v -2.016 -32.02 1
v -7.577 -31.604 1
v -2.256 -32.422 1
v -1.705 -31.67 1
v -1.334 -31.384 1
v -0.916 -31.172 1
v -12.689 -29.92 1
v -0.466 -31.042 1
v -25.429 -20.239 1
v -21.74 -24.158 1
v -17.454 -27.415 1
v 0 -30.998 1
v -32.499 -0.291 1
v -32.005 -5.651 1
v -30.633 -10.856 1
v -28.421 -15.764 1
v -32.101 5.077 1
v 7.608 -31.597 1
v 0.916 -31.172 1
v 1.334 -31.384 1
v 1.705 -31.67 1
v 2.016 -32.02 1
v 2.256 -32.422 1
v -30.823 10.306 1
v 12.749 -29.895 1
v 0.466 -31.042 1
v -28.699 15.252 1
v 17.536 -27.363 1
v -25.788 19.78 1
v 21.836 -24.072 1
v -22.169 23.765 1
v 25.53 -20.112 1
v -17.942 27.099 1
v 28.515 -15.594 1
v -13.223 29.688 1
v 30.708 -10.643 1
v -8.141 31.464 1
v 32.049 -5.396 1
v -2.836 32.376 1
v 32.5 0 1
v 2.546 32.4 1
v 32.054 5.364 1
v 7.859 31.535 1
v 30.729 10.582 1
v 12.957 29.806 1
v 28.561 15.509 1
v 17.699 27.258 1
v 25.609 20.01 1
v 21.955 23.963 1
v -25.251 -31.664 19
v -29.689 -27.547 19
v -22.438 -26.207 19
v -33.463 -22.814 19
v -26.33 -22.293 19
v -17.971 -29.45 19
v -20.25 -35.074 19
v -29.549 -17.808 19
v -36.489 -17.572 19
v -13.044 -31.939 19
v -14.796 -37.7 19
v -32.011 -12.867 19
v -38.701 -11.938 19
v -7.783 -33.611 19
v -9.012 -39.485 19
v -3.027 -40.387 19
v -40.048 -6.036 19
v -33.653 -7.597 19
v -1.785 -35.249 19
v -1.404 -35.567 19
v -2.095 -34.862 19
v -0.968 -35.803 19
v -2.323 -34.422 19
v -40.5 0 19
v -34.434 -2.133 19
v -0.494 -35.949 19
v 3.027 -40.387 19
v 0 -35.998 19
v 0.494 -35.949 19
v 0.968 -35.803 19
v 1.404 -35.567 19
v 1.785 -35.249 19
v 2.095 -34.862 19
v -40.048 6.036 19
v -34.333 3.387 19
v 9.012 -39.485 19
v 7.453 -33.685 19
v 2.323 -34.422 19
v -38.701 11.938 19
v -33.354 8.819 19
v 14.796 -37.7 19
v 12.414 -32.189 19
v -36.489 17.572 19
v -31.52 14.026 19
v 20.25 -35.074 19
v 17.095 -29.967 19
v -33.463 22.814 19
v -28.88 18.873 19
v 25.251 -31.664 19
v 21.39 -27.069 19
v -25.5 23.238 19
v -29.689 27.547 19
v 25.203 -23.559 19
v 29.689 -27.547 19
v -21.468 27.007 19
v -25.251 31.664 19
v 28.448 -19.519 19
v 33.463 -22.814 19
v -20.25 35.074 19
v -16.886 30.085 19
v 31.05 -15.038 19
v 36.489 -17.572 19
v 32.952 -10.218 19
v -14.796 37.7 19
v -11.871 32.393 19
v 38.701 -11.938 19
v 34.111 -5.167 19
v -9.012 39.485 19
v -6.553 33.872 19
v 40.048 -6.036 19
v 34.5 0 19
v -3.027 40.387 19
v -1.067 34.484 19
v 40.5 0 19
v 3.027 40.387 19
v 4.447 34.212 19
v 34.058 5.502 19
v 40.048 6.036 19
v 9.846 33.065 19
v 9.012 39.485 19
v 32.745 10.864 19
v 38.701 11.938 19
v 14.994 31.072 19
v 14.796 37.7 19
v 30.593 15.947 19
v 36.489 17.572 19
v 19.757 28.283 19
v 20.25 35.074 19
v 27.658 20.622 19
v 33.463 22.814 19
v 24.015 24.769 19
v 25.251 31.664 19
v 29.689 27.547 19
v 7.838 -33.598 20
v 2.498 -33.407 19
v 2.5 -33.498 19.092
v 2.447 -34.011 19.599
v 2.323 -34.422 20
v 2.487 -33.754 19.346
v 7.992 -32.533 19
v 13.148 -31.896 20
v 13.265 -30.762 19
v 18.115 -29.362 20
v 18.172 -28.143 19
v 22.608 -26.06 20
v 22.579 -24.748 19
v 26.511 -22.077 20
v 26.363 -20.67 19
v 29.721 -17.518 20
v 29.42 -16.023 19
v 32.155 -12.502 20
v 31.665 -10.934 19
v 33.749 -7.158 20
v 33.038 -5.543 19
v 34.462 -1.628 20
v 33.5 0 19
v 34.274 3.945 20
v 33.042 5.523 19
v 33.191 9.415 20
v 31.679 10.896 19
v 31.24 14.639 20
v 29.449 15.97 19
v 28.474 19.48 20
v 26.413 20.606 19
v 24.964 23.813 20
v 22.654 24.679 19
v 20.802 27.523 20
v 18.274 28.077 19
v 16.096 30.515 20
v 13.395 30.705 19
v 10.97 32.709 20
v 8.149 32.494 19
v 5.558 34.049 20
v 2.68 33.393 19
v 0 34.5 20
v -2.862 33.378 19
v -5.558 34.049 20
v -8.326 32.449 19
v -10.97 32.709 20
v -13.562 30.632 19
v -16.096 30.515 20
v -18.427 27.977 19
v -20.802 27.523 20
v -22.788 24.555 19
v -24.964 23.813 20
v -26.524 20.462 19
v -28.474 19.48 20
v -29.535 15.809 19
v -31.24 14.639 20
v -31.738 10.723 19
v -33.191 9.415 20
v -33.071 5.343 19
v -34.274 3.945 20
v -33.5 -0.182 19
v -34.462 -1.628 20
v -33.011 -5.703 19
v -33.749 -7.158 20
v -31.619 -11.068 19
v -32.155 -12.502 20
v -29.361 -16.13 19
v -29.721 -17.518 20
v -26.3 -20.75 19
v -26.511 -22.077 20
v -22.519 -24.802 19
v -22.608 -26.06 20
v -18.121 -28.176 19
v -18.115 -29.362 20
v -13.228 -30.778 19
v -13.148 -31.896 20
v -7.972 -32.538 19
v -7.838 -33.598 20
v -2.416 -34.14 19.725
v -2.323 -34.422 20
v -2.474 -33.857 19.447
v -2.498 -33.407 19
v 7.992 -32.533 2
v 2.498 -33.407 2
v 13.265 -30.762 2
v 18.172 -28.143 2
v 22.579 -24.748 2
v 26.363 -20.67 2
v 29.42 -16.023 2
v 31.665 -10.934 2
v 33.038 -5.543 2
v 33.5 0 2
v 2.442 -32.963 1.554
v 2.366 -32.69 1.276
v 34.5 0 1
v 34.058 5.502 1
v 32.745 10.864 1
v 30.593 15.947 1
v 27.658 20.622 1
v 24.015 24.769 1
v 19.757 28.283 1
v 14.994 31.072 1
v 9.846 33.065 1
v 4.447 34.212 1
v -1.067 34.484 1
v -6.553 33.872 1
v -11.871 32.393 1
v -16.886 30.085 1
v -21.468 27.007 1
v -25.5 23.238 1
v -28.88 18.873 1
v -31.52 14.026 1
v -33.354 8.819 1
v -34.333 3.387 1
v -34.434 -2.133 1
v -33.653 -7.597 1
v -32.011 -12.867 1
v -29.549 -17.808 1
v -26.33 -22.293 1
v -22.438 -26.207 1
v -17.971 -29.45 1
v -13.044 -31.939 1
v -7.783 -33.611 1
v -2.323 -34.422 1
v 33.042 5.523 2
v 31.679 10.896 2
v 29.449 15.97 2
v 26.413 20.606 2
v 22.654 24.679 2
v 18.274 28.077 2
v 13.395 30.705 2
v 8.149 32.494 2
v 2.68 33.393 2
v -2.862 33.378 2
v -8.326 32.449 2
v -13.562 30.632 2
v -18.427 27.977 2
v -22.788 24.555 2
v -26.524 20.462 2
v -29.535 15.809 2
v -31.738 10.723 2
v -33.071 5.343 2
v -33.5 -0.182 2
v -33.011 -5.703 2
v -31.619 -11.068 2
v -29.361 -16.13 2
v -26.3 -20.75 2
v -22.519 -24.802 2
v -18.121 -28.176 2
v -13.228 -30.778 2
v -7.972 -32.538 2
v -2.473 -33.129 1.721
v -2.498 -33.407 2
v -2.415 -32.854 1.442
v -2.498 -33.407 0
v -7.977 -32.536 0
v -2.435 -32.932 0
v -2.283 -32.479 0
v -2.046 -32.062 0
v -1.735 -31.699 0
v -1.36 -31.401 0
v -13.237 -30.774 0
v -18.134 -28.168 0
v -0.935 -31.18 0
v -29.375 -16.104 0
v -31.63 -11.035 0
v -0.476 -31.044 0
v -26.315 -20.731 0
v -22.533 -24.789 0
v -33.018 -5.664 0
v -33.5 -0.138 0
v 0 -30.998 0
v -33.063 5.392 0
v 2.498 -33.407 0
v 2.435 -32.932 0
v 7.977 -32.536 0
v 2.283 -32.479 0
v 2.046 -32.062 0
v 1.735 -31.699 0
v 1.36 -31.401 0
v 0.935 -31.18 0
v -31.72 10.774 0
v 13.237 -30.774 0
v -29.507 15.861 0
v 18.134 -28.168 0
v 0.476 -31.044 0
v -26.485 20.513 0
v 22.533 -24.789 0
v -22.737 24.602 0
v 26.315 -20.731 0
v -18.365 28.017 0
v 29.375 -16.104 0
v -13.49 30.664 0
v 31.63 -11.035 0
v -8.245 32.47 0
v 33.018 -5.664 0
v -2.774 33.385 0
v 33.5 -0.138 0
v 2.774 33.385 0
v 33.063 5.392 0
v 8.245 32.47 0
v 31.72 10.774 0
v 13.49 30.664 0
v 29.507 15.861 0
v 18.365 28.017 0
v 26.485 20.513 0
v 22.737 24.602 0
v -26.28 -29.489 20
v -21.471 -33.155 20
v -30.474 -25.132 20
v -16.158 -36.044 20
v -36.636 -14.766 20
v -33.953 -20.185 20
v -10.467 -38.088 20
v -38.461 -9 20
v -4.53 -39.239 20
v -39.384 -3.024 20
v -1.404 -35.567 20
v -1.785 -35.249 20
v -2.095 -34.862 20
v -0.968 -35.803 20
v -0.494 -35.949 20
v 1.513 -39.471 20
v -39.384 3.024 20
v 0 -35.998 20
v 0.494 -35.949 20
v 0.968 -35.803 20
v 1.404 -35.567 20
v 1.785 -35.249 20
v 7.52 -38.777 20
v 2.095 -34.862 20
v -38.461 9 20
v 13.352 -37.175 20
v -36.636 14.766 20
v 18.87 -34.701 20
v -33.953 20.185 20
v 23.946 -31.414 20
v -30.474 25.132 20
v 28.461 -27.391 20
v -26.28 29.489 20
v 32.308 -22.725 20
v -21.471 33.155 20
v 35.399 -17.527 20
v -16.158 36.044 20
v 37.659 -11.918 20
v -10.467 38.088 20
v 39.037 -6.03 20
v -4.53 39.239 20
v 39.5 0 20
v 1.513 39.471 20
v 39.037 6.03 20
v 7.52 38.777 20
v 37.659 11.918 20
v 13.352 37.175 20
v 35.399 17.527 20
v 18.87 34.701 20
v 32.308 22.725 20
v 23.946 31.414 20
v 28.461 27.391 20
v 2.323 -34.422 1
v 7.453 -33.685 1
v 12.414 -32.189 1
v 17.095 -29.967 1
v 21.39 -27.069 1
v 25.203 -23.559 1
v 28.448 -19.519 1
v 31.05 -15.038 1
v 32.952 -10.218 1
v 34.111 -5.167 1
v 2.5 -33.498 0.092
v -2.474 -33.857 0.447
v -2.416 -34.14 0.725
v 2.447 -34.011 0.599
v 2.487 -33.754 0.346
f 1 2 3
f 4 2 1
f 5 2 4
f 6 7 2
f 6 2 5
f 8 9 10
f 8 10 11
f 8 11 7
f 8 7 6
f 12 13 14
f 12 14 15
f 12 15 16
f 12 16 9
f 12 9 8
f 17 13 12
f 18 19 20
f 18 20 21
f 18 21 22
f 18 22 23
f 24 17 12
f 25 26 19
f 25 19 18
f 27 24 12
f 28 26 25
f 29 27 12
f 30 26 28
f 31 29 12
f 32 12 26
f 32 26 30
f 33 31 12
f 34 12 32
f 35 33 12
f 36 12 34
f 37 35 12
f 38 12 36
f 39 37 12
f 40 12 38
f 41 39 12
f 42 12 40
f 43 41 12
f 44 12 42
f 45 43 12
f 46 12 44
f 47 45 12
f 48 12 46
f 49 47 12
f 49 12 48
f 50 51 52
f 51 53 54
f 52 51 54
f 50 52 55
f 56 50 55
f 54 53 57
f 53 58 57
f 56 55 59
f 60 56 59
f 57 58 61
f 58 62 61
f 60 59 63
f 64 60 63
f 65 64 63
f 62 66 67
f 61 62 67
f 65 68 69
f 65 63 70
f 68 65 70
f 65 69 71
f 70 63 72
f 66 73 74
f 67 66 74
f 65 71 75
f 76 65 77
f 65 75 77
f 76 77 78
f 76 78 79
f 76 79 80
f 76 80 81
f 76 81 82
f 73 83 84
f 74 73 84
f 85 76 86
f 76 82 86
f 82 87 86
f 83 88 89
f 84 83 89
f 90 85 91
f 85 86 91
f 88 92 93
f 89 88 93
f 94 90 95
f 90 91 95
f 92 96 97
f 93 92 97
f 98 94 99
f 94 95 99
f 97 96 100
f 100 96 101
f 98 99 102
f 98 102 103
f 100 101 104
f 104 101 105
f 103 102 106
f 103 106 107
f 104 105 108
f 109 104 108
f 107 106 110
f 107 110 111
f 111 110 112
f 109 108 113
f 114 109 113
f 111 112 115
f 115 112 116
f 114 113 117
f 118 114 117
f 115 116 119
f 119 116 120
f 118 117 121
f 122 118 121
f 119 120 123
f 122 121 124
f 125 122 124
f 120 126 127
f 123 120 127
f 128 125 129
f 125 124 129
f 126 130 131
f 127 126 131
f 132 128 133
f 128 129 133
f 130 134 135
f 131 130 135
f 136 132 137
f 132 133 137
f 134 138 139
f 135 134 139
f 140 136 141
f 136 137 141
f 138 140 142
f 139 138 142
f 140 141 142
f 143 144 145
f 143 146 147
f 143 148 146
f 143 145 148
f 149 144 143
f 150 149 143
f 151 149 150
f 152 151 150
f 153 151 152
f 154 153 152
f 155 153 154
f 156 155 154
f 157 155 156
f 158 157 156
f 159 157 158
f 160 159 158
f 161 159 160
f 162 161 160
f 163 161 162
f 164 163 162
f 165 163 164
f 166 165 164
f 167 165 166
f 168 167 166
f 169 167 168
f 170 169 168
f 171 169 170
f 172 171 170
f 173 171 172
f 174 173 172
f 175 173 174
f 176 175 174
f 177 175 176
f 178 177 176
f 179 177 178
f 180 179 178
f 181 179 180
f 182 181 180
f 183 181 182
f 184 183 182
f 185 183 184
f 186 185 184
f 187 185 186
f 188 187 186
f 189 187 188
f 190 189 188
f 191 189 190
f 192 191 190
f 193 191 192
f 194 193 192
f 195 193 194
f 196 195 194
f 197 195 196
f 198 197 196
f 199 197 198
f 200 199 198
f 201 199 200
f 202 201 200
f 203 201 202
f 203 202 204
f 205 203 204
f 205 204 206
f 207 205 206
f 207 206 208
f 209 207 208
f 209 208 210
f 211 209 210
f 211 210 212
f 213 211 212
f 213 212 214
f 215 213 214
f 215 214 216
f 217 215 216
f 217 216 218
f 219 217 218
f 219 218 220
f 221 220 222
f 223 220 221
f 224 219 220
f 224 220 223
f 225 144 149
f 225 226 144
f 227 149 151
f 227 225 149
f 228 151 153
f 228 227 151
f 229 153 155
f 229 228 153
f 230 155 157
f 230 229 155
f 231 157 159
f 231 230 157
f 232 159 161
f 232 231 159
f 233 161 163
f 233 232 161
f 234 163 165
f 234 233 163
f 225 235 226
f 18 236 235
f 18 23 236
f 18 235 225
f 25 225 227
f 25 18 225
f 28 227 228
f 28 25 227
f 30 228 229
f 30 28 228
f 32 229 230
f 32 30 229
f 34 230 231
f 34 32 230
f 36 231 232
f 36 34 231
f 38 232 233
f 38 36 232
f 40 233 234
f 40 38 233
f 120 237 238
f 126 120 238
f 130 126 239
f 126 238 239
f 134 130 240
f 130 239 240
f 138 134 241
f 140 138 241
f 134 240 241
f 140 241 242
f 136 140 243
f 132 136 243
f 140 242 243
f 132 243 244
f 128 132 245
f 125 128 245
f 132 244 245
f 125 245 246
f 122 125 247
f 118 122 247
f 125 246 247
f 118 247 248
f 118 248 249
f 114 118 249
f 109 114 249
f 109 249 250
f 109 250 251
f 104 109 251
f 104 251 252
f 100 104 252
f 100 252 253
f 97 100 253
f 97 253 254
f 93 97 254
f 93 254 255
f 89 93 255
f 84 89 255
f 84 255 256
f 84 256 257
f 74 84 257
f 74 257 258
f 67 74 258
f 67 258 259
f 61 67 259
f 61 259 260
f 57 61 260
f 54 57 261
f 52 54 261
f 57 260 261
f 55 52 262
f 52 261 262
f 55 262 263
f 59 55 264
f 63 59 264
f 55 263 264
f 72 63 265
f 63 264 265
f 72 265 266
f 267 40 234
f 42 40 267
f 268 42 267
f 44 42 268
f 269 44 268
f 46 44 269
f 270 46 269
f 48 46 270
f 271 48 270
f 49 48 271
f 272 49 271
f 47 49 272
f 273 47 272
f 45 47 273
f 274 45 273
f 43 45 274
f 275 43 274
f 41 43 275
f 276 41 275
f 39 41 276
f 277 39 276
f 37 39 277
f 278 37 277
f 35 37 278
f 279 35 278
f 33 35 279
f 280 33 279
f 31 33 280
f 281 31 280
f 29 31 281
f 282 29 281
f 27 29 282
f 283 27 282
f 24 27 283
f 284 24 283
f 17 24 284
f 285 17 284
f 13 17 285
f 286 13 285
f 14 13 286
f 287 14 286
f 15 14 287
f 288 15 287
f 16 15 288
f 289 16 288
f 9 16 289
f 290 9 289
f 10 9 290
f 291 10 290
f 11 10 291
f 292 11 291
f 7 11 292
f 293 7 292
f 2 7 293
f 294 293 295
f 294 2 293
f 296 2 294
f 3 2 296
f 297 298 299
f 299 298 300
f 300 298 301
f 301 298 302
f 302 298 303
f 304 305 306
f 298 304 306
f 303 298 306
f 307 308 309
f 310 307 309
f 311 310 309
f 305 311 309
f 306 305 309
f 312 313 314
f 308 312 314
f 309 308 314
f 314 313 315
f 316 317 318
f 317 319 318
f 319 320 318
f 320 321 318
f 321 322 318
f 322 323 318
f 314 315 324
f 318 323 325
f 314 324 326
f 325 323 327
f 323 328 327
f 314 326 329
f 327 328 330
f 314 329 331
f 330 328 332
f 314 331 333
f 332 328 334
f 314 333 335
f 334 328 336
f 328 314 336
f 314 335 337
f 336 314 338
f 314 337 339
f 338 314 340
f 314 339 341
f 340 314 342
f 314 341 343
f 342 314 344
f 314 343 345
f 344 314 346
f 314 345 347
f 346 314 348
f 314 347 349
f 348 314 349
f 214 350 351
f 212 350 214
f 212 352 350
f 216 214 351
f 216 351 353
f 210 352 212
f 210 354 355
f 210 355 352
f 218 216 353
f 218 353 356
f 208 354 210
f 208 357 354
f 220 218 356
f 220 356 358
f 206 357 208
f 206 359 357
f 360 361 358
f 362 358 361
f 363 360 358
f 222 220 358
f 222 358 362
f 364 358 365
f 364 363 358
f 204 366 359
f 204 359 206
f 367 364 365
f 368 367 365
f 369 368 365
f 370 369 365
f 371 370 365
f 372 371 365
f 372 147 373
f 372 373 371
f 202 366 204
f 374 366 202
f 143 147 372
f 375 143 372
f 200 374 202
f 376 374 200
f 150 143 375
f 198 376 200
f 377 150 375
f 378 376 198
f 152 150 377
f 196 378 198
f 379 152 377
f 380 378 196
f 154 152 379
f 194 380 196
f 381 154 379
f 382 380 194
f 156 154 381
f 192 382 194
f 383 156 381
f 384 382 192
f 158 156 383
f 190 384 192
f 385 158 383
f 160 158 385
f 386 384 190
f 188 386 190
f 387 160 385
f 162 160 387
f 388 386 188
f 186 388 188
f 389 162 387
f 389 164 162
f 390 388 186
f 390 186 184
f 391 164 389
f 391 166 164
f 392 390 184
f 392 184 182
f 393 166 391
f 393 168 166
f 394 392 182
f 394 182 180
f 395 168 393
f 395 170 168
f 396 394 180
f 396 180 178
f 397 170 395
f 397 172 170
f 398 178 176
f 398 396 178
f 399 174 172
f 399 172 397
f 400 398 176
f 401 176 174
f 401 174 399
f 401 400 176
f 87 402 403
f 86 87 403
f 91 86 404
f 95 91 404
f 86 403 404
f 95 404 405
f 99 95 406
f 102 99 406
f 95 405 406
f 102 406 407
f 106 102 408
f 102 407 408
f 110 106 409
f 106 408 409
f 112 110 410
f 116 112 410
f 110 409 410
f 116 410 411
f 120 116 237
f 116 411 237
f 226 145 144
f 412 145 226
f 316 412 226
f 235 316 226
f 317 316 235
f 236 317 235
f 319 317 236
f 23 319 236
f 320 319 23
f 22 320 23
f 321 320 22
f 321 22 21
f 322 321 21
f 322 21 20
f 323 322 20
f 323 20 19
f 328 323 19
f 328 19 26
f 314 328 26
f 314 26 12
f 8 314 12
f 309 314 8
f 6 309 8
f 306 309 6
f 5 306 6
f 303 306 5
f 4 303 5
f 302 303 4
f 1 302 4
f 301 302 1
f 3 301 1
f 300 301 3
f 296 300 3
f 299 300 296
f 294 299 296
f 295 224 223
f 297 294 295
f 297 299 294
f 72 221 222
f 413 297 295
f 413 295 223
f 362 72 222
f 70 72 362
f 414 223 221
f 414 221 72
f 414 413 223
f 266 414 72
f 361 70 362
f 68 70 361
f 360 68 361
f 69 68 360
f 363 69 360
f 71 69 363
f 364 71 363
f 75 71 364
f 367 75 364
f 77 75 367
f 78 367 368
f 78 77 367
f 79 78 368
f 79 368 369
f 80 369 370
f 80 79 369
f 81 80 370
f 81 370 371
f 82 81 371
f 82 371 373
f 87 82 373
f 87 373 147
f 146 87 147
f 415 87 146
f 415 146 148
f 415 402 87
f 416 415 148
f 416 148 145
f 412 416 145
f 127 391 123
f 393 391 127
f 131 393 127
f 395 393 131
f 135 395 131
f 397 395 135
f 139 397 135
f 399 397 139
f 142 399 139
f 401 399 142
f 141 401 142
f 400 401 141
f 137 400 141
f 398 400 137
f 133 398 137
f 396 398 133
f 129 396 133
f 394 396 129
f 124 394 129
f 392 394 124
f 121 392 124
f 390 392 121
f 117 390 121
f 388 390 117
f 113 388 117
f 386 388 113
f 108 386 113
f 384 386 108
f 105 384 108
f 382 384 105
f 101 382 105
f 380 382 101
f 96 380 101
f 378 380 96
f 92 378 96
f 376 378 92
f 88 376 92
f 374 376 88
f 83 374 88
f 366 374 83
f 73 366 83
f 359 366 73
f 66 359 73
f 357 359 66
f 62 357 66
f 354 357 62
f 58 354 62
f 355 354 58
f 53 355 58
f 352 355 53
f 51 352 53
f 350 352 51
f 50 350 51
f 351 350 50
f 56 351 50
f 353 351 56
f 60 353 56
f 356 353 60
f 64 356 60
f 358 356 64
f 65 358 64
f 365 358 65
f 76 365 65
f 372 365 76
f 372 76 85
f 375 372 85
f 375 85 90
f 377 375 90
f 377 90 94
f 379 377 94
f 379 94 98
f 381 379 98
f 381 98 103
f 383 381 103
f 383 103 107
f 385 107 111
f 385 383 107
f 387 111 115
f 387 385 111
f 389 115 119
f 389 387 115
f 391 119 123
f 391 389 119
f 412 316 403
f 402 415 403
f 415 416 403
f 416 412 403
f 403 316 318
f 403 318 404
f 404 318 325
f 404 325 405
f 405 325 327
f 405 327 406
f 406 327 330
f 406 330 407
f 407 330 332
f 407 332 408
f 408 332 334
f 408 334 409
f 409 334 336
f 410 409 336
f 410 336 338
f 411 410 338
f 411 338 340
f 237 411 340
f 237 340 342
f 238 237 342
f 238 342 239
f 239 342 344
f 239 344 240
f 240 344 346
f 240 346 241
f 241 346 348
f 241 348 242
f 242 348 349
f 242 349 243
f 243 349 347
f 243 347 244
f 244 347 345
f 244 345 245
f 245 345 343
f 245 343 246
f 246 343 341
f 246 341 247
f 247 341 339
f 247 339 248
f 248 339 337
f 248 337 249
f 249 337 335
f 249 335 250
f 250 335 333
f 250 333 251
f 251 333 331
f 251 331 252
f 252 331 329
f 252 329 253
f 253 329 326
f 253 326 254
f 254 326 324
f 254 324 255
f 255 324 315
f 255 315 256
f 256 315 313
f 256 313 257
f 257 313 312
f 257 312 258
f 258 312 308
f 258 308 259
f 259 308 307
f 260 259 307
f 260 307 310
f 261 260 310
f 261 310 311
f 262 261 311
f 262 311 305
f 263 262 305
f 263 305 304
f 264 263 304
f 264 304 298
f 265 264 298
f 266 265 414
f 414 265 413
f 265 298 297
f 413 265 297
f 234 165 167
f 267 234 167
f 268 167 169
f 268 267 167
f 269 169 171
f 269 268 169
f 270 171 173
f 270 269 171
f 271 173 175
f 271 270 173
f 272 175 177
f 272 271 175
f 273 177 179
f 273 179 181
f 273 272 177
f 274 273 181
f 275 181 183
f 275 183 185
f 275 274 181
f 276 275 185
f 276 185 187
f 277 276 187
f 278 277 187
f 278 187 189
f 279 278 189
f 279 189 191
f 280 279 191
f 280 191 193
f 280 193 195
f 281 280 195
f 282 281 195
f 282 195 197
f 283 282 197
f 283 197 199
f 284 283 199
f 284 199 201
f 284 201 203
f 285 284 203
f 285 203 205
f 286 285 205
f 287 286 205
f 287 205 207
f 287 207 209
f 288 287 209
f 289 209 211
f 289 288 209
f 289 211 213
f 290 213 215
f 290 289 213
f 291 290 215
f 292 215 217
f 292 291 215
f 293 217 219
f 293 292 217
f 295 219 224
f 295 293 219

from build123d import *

# Parameters (mm, degrees)
F0_R     = 34.5
F1_DEPTH = 1
F2_R     = 34.5
F2_R_2   = 33.5
F3_DEPTH = 18
F4_R     = 40.5
F4_R_2   = 34.5
F4_R_3   = 33.5
F5_DEPTH = 1
F6_SIZE  = 0.99999
F7_R     = 2.5
F8_DEPTH = 25


# Not quite as in the source:
# - a fillet or chamfer is up to 0.001 mm smaller than in the source, because OpenCascade refuses the exact size


with BuildPart() as f1:
    # F0 (on Top) → F1 (new body)
    with BuildSketch(Plane.XY):
        Circle(F0_R)
    extrude(amount=F1_DEPTH)

    # F2 (on face) → F3 (join)
    with BuildSketch(Plane.XY.offset(1)):
        Circle(F2_R)
        Circle(F2_R_2, mode=Mode.SUBTRACT)
    extrude(amount=F3_DEPTH)

    # F4 (on face) → F5 (join)
    with BuildSketch(Plane.XY.offset(19)):
        Circle(F4_R)
        Circle(F4_R_2, mode=Mode.SUBTRACT)
        Circle(F4_R_2)
        Circle(F4_R_3, mode=Mode.SUBTRACT)
    extrude(amount=F5_DEPTH)

    # F6 (size 1 in the source; OpenCascade refuses exactly that, so slightly less here)
    f6_edges = [f1.edges().sort_by_distance(p)[0] for p in [
        (-33.5, 0, 1),
        (-34.5, 0, 0),
        (-33.5, 0, 20),
        (-40.5, 0, 20),
    ]]
    chamfer(f6_edges, length=F6_SIZE)


with BuildPart() as f8:
    # F7 (on Top) → F8 (new body)
    with BuildSketch(Plane.XY):
        with Locations((0, -33.4984026849)):
            Circle(F7_R)
    extrude(amount=F8_DEPTH)


with BuildPart() as f1_1:
    add(f1.part)

    # F9: cut F8
    add(f8.part, mode=Mode.SUBTRACT)


solid = f1_1.part
